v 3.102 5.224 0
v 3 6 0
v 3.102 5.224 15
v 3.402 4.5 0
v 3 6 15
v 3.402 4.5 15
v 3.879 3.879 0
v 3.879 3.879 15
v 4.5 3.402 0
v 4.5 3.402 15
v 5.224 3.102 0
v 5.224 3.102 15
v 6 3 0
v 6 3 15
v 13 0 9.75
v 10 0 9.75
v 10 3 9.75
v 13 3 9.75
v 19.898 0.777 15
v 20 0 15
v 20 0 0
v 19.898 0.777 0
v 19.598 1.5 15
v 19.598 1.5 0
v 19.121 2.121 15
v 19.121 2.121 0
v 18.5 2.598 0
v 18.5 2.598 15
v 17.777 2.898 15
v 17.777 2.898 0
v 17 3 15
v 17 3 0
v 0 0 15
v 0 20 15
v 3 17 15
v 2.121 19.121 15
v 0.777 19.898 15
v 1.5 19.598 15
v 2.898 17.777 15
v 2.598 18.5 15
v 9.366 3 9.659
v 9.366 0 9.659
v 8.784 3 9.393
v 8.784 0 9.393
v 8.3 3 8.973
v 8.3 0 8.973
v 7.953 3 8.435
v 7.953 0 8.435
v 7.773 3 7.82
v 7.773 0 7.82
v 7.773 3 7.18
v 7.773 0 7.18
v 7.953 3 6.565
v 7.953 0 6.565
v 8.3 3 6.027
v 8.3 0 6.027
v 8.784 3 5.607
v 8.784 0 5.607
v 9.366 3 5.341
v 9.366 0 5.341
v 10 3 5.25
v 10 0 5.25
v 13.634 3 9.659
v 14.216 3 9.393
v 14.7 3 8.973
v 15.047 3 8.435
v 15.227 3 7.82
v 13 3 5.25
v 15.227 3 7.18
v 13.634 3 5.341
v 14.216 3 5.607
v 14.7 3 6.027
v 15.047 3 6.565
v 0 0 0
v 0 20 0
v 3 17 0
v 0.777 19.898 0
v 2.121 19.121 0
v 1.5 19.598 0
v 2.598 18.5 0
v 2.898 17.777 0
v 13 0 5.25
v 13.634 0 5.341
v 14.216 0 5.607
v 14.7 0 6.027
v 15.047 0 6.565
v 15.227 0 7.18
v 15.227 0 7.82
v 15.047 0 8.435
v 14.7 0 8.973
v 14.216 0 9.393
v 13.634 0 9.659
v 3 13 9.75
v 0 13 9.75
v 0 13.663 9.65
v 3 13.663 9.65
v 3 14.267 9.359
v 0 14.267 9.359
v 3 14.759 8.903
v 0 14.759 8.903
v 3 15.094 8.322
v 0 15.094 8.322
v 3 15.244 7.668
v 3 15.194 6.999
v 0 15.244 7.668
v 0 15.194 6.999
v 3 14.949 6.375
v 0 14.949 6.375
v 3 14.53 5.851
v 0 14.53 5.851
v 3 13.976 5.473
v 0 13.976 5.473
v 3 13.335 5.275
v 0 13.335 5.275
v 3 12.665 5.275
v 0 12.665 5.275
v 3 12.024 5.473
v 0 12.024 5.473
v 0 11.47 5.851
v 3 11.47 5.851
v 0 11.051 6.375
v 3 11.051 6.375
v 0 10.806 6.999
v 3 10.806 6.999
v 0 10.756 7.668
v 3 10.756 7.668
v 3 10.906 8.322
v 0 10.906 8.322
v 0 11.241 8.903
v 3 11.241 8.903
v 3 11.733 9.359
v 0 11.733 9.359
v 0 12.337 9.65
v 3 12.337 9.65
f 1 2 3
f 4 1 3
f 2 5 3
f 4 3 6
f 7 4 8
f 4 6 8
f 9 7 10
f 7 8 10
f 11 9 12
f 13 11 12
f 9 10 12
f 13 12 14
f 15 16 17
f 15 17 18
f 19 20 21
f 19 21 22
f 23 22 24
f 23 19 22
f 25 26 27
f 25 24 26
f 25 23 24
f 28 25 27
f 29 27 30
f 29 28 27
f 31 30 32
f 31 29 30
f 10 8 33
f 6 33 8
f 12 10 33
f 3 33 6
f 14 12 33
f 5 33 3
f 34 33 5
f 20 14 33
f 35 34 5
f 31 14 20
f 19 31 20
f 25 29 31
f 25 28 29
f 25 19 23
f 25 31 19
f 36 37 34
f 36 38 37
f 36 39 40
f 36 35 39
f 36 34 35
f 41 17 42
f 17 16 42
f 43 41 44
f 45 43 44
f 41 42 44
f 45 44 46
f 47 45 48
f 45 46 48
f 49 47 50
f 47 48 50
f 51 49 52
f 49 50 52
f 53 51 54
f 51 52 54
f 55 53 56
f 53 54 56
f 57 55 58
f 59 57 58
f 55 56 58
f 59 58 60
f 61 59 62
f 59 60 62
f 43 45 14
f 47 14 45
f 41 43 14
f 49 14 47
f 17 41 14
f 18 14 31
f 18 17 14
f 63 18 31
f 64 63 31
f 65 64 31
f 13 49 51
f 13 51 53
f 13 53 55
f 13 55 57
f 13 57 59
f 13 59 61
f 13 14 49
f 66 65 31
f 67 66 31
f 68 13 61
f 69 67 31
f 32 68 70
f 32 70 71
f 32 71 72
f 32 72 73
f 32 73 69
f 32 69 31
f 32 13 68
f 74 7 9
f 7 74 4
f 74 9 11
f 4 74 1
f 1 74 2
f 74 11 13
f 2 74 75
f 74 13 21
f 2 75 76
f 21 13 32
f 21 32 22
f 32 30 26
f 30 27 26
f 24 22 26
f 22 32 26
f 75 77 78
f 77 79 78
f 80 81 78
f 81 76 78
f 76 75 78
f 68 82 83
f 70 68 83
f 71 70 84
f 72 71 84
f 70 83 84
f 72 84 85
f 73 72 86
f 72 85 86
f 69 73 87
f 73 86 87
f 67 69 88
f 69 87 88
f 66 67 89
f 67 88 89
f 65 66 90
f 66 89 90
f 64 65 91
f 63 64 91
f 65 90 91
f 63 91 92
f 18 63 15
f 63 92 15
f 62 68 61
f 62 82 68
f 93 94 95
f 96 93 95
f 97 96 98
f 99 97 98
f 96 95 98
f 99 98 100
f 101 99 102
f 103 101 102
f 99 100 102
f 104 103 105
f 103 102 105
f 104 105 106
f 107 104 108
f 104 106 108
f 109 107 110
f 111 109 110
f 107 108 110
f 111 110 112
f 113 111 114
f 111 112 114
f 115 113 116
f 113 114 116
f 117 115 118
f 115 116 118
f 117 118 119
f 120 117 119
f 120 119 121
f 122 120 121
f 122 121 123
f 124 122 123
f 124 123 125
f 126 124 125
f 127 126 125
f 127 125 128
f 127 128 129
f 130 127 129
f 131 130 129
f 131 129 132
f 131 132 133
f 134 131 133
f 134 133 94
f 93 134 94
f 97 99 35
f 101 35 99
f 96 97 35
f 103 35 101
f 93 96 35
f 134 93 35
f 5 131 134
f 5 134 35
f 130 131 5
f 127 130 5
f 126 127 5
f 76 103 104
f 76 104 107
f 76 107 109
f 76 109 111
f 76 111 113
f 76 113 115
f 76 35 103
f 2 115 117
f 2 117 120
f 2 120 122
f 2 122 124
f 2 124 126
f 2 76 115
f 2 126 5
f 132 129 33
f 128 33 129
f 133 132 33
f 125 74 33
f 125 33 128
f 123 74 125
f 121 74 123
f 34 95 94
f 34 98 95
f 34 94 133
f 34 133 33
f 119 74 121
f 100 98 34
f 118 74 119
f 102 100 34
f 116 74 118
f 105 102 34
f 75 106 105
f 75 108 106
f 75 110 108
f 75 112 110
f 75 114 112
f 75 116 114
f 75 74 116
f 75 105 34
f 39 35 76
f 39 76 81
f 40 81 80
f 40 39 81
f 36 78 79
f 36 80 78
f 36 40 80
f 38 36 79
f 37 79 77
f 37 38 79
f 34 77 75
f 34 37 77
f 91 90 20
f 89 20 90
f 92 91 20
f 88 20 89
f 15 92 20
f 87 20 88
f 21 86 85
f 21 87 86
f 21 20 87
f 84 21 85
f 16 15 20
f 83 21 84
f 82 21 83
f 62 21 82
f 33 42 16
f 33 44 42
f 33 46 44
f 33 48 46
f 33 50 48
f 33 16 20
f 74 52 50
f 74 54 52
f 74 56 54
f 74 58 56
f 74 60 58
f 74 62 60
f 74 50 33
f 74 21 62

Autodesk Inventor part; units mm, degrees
ref_plane "YZ Plane" through (0, 0, 0) normal (1, 0, 0) x (0, 1, 0)
ref_plane "XZ Plane" through (0, 0, 0) normal (0, 1, 0) x (-1, 0, 0)
ref_plane "XY Plane" through (0, 0, 0) normal (0, 0, 1) x (1, 0, 0)
sketch "スケッチ1" plane through (0, 0, 0) normal (0, 0, 1) x (1, 0, 0)
  line L0 (0, 0) -> (0, 20)
  line L1 (0, 20) -> (3, 20)
  line L2 (3, 20) -> (3, 3)
  line L3 (3, 3) -> (20, 3)
  line L4 (20, 3) -> (20, 0)
  line L5 (20, 0) -> (0, 0)
  dimension "d0" = 3
  dimension "d1" = 3
  dimension "d2" = 20
  dimension "d3" = 20
extrude "押し出し1" add sketch "スケッチ1" along normal blind 15
fillet "フィレット1" radius 3 2 edges at (3, 20, 7.5) (20, 3, 7.5)
sketch "スケッチ2" plane through (0, 0, 0) normal (-1, 0, 0) x (0, 0, 1)
  line L0 (0, 0) -> (0, 20) construction
  line L1 (0, 0) -> (15, 0) construction
  line L2 (15, 20) -> (15, 0) construction
  line L3 (0, 20) -> (15, 20) construction
  circle A0 centre (7.5, 13) radius 2.25
  dimension "d7" = 13
  dimension "d8" = 4.5
  dimension "d9" = 7.5
extrude "押し出し2" cut sketch "スケッチ2" against normal through all
sketch "スケッチ3" plane through (0, 0, 0) normal (0, -1, 0) x (1, 0, 0)
  arc A0 (10, 9.75) -> (10, 5.25) centre (10, 7.5) ccw
  line L0 (10, 7.5) -> (10, 9.75) construction
  line L1 (10, 7.5) -> (12.25, 7.5) construction
  line L2 (10, 7.5) -> (10, 5.25) construction
  arc A1 (13, 5.25) -> (13, 9.75) centre (13, 7.5) ccw
  line L3 (13, 7.5) -> (13, 9.75) construction
  line L4 (13, 7.5) -> (15.25, 7.5) construction
  line L5 (13, 7.5) -> (13, 5.25) construction
  line L6 (10, 9.75) -> (13, 9.75)
  line L7 (0, 15) -> (20, 15) projected
  line L8 (13, 5.25) -> (10, 5.25)
  line L9 (0, 0) -> (0, 15) projected
  dimension "d12" = 90
  dimension "d13" = 180
  dimension "d14" = 90
  dimension "d15" = 180
  dimension "d16" = 7.5
  dimension "d17" = 3
  dimension "d18" = 10
  dimension "d19" = 2.25
extrude "押し出し3" cut sketch "スケッチ3" against normal through all
fillet "フィレット2" radius 3 1 edges at (3, 3, 7.5)
properties part number "M4L"
